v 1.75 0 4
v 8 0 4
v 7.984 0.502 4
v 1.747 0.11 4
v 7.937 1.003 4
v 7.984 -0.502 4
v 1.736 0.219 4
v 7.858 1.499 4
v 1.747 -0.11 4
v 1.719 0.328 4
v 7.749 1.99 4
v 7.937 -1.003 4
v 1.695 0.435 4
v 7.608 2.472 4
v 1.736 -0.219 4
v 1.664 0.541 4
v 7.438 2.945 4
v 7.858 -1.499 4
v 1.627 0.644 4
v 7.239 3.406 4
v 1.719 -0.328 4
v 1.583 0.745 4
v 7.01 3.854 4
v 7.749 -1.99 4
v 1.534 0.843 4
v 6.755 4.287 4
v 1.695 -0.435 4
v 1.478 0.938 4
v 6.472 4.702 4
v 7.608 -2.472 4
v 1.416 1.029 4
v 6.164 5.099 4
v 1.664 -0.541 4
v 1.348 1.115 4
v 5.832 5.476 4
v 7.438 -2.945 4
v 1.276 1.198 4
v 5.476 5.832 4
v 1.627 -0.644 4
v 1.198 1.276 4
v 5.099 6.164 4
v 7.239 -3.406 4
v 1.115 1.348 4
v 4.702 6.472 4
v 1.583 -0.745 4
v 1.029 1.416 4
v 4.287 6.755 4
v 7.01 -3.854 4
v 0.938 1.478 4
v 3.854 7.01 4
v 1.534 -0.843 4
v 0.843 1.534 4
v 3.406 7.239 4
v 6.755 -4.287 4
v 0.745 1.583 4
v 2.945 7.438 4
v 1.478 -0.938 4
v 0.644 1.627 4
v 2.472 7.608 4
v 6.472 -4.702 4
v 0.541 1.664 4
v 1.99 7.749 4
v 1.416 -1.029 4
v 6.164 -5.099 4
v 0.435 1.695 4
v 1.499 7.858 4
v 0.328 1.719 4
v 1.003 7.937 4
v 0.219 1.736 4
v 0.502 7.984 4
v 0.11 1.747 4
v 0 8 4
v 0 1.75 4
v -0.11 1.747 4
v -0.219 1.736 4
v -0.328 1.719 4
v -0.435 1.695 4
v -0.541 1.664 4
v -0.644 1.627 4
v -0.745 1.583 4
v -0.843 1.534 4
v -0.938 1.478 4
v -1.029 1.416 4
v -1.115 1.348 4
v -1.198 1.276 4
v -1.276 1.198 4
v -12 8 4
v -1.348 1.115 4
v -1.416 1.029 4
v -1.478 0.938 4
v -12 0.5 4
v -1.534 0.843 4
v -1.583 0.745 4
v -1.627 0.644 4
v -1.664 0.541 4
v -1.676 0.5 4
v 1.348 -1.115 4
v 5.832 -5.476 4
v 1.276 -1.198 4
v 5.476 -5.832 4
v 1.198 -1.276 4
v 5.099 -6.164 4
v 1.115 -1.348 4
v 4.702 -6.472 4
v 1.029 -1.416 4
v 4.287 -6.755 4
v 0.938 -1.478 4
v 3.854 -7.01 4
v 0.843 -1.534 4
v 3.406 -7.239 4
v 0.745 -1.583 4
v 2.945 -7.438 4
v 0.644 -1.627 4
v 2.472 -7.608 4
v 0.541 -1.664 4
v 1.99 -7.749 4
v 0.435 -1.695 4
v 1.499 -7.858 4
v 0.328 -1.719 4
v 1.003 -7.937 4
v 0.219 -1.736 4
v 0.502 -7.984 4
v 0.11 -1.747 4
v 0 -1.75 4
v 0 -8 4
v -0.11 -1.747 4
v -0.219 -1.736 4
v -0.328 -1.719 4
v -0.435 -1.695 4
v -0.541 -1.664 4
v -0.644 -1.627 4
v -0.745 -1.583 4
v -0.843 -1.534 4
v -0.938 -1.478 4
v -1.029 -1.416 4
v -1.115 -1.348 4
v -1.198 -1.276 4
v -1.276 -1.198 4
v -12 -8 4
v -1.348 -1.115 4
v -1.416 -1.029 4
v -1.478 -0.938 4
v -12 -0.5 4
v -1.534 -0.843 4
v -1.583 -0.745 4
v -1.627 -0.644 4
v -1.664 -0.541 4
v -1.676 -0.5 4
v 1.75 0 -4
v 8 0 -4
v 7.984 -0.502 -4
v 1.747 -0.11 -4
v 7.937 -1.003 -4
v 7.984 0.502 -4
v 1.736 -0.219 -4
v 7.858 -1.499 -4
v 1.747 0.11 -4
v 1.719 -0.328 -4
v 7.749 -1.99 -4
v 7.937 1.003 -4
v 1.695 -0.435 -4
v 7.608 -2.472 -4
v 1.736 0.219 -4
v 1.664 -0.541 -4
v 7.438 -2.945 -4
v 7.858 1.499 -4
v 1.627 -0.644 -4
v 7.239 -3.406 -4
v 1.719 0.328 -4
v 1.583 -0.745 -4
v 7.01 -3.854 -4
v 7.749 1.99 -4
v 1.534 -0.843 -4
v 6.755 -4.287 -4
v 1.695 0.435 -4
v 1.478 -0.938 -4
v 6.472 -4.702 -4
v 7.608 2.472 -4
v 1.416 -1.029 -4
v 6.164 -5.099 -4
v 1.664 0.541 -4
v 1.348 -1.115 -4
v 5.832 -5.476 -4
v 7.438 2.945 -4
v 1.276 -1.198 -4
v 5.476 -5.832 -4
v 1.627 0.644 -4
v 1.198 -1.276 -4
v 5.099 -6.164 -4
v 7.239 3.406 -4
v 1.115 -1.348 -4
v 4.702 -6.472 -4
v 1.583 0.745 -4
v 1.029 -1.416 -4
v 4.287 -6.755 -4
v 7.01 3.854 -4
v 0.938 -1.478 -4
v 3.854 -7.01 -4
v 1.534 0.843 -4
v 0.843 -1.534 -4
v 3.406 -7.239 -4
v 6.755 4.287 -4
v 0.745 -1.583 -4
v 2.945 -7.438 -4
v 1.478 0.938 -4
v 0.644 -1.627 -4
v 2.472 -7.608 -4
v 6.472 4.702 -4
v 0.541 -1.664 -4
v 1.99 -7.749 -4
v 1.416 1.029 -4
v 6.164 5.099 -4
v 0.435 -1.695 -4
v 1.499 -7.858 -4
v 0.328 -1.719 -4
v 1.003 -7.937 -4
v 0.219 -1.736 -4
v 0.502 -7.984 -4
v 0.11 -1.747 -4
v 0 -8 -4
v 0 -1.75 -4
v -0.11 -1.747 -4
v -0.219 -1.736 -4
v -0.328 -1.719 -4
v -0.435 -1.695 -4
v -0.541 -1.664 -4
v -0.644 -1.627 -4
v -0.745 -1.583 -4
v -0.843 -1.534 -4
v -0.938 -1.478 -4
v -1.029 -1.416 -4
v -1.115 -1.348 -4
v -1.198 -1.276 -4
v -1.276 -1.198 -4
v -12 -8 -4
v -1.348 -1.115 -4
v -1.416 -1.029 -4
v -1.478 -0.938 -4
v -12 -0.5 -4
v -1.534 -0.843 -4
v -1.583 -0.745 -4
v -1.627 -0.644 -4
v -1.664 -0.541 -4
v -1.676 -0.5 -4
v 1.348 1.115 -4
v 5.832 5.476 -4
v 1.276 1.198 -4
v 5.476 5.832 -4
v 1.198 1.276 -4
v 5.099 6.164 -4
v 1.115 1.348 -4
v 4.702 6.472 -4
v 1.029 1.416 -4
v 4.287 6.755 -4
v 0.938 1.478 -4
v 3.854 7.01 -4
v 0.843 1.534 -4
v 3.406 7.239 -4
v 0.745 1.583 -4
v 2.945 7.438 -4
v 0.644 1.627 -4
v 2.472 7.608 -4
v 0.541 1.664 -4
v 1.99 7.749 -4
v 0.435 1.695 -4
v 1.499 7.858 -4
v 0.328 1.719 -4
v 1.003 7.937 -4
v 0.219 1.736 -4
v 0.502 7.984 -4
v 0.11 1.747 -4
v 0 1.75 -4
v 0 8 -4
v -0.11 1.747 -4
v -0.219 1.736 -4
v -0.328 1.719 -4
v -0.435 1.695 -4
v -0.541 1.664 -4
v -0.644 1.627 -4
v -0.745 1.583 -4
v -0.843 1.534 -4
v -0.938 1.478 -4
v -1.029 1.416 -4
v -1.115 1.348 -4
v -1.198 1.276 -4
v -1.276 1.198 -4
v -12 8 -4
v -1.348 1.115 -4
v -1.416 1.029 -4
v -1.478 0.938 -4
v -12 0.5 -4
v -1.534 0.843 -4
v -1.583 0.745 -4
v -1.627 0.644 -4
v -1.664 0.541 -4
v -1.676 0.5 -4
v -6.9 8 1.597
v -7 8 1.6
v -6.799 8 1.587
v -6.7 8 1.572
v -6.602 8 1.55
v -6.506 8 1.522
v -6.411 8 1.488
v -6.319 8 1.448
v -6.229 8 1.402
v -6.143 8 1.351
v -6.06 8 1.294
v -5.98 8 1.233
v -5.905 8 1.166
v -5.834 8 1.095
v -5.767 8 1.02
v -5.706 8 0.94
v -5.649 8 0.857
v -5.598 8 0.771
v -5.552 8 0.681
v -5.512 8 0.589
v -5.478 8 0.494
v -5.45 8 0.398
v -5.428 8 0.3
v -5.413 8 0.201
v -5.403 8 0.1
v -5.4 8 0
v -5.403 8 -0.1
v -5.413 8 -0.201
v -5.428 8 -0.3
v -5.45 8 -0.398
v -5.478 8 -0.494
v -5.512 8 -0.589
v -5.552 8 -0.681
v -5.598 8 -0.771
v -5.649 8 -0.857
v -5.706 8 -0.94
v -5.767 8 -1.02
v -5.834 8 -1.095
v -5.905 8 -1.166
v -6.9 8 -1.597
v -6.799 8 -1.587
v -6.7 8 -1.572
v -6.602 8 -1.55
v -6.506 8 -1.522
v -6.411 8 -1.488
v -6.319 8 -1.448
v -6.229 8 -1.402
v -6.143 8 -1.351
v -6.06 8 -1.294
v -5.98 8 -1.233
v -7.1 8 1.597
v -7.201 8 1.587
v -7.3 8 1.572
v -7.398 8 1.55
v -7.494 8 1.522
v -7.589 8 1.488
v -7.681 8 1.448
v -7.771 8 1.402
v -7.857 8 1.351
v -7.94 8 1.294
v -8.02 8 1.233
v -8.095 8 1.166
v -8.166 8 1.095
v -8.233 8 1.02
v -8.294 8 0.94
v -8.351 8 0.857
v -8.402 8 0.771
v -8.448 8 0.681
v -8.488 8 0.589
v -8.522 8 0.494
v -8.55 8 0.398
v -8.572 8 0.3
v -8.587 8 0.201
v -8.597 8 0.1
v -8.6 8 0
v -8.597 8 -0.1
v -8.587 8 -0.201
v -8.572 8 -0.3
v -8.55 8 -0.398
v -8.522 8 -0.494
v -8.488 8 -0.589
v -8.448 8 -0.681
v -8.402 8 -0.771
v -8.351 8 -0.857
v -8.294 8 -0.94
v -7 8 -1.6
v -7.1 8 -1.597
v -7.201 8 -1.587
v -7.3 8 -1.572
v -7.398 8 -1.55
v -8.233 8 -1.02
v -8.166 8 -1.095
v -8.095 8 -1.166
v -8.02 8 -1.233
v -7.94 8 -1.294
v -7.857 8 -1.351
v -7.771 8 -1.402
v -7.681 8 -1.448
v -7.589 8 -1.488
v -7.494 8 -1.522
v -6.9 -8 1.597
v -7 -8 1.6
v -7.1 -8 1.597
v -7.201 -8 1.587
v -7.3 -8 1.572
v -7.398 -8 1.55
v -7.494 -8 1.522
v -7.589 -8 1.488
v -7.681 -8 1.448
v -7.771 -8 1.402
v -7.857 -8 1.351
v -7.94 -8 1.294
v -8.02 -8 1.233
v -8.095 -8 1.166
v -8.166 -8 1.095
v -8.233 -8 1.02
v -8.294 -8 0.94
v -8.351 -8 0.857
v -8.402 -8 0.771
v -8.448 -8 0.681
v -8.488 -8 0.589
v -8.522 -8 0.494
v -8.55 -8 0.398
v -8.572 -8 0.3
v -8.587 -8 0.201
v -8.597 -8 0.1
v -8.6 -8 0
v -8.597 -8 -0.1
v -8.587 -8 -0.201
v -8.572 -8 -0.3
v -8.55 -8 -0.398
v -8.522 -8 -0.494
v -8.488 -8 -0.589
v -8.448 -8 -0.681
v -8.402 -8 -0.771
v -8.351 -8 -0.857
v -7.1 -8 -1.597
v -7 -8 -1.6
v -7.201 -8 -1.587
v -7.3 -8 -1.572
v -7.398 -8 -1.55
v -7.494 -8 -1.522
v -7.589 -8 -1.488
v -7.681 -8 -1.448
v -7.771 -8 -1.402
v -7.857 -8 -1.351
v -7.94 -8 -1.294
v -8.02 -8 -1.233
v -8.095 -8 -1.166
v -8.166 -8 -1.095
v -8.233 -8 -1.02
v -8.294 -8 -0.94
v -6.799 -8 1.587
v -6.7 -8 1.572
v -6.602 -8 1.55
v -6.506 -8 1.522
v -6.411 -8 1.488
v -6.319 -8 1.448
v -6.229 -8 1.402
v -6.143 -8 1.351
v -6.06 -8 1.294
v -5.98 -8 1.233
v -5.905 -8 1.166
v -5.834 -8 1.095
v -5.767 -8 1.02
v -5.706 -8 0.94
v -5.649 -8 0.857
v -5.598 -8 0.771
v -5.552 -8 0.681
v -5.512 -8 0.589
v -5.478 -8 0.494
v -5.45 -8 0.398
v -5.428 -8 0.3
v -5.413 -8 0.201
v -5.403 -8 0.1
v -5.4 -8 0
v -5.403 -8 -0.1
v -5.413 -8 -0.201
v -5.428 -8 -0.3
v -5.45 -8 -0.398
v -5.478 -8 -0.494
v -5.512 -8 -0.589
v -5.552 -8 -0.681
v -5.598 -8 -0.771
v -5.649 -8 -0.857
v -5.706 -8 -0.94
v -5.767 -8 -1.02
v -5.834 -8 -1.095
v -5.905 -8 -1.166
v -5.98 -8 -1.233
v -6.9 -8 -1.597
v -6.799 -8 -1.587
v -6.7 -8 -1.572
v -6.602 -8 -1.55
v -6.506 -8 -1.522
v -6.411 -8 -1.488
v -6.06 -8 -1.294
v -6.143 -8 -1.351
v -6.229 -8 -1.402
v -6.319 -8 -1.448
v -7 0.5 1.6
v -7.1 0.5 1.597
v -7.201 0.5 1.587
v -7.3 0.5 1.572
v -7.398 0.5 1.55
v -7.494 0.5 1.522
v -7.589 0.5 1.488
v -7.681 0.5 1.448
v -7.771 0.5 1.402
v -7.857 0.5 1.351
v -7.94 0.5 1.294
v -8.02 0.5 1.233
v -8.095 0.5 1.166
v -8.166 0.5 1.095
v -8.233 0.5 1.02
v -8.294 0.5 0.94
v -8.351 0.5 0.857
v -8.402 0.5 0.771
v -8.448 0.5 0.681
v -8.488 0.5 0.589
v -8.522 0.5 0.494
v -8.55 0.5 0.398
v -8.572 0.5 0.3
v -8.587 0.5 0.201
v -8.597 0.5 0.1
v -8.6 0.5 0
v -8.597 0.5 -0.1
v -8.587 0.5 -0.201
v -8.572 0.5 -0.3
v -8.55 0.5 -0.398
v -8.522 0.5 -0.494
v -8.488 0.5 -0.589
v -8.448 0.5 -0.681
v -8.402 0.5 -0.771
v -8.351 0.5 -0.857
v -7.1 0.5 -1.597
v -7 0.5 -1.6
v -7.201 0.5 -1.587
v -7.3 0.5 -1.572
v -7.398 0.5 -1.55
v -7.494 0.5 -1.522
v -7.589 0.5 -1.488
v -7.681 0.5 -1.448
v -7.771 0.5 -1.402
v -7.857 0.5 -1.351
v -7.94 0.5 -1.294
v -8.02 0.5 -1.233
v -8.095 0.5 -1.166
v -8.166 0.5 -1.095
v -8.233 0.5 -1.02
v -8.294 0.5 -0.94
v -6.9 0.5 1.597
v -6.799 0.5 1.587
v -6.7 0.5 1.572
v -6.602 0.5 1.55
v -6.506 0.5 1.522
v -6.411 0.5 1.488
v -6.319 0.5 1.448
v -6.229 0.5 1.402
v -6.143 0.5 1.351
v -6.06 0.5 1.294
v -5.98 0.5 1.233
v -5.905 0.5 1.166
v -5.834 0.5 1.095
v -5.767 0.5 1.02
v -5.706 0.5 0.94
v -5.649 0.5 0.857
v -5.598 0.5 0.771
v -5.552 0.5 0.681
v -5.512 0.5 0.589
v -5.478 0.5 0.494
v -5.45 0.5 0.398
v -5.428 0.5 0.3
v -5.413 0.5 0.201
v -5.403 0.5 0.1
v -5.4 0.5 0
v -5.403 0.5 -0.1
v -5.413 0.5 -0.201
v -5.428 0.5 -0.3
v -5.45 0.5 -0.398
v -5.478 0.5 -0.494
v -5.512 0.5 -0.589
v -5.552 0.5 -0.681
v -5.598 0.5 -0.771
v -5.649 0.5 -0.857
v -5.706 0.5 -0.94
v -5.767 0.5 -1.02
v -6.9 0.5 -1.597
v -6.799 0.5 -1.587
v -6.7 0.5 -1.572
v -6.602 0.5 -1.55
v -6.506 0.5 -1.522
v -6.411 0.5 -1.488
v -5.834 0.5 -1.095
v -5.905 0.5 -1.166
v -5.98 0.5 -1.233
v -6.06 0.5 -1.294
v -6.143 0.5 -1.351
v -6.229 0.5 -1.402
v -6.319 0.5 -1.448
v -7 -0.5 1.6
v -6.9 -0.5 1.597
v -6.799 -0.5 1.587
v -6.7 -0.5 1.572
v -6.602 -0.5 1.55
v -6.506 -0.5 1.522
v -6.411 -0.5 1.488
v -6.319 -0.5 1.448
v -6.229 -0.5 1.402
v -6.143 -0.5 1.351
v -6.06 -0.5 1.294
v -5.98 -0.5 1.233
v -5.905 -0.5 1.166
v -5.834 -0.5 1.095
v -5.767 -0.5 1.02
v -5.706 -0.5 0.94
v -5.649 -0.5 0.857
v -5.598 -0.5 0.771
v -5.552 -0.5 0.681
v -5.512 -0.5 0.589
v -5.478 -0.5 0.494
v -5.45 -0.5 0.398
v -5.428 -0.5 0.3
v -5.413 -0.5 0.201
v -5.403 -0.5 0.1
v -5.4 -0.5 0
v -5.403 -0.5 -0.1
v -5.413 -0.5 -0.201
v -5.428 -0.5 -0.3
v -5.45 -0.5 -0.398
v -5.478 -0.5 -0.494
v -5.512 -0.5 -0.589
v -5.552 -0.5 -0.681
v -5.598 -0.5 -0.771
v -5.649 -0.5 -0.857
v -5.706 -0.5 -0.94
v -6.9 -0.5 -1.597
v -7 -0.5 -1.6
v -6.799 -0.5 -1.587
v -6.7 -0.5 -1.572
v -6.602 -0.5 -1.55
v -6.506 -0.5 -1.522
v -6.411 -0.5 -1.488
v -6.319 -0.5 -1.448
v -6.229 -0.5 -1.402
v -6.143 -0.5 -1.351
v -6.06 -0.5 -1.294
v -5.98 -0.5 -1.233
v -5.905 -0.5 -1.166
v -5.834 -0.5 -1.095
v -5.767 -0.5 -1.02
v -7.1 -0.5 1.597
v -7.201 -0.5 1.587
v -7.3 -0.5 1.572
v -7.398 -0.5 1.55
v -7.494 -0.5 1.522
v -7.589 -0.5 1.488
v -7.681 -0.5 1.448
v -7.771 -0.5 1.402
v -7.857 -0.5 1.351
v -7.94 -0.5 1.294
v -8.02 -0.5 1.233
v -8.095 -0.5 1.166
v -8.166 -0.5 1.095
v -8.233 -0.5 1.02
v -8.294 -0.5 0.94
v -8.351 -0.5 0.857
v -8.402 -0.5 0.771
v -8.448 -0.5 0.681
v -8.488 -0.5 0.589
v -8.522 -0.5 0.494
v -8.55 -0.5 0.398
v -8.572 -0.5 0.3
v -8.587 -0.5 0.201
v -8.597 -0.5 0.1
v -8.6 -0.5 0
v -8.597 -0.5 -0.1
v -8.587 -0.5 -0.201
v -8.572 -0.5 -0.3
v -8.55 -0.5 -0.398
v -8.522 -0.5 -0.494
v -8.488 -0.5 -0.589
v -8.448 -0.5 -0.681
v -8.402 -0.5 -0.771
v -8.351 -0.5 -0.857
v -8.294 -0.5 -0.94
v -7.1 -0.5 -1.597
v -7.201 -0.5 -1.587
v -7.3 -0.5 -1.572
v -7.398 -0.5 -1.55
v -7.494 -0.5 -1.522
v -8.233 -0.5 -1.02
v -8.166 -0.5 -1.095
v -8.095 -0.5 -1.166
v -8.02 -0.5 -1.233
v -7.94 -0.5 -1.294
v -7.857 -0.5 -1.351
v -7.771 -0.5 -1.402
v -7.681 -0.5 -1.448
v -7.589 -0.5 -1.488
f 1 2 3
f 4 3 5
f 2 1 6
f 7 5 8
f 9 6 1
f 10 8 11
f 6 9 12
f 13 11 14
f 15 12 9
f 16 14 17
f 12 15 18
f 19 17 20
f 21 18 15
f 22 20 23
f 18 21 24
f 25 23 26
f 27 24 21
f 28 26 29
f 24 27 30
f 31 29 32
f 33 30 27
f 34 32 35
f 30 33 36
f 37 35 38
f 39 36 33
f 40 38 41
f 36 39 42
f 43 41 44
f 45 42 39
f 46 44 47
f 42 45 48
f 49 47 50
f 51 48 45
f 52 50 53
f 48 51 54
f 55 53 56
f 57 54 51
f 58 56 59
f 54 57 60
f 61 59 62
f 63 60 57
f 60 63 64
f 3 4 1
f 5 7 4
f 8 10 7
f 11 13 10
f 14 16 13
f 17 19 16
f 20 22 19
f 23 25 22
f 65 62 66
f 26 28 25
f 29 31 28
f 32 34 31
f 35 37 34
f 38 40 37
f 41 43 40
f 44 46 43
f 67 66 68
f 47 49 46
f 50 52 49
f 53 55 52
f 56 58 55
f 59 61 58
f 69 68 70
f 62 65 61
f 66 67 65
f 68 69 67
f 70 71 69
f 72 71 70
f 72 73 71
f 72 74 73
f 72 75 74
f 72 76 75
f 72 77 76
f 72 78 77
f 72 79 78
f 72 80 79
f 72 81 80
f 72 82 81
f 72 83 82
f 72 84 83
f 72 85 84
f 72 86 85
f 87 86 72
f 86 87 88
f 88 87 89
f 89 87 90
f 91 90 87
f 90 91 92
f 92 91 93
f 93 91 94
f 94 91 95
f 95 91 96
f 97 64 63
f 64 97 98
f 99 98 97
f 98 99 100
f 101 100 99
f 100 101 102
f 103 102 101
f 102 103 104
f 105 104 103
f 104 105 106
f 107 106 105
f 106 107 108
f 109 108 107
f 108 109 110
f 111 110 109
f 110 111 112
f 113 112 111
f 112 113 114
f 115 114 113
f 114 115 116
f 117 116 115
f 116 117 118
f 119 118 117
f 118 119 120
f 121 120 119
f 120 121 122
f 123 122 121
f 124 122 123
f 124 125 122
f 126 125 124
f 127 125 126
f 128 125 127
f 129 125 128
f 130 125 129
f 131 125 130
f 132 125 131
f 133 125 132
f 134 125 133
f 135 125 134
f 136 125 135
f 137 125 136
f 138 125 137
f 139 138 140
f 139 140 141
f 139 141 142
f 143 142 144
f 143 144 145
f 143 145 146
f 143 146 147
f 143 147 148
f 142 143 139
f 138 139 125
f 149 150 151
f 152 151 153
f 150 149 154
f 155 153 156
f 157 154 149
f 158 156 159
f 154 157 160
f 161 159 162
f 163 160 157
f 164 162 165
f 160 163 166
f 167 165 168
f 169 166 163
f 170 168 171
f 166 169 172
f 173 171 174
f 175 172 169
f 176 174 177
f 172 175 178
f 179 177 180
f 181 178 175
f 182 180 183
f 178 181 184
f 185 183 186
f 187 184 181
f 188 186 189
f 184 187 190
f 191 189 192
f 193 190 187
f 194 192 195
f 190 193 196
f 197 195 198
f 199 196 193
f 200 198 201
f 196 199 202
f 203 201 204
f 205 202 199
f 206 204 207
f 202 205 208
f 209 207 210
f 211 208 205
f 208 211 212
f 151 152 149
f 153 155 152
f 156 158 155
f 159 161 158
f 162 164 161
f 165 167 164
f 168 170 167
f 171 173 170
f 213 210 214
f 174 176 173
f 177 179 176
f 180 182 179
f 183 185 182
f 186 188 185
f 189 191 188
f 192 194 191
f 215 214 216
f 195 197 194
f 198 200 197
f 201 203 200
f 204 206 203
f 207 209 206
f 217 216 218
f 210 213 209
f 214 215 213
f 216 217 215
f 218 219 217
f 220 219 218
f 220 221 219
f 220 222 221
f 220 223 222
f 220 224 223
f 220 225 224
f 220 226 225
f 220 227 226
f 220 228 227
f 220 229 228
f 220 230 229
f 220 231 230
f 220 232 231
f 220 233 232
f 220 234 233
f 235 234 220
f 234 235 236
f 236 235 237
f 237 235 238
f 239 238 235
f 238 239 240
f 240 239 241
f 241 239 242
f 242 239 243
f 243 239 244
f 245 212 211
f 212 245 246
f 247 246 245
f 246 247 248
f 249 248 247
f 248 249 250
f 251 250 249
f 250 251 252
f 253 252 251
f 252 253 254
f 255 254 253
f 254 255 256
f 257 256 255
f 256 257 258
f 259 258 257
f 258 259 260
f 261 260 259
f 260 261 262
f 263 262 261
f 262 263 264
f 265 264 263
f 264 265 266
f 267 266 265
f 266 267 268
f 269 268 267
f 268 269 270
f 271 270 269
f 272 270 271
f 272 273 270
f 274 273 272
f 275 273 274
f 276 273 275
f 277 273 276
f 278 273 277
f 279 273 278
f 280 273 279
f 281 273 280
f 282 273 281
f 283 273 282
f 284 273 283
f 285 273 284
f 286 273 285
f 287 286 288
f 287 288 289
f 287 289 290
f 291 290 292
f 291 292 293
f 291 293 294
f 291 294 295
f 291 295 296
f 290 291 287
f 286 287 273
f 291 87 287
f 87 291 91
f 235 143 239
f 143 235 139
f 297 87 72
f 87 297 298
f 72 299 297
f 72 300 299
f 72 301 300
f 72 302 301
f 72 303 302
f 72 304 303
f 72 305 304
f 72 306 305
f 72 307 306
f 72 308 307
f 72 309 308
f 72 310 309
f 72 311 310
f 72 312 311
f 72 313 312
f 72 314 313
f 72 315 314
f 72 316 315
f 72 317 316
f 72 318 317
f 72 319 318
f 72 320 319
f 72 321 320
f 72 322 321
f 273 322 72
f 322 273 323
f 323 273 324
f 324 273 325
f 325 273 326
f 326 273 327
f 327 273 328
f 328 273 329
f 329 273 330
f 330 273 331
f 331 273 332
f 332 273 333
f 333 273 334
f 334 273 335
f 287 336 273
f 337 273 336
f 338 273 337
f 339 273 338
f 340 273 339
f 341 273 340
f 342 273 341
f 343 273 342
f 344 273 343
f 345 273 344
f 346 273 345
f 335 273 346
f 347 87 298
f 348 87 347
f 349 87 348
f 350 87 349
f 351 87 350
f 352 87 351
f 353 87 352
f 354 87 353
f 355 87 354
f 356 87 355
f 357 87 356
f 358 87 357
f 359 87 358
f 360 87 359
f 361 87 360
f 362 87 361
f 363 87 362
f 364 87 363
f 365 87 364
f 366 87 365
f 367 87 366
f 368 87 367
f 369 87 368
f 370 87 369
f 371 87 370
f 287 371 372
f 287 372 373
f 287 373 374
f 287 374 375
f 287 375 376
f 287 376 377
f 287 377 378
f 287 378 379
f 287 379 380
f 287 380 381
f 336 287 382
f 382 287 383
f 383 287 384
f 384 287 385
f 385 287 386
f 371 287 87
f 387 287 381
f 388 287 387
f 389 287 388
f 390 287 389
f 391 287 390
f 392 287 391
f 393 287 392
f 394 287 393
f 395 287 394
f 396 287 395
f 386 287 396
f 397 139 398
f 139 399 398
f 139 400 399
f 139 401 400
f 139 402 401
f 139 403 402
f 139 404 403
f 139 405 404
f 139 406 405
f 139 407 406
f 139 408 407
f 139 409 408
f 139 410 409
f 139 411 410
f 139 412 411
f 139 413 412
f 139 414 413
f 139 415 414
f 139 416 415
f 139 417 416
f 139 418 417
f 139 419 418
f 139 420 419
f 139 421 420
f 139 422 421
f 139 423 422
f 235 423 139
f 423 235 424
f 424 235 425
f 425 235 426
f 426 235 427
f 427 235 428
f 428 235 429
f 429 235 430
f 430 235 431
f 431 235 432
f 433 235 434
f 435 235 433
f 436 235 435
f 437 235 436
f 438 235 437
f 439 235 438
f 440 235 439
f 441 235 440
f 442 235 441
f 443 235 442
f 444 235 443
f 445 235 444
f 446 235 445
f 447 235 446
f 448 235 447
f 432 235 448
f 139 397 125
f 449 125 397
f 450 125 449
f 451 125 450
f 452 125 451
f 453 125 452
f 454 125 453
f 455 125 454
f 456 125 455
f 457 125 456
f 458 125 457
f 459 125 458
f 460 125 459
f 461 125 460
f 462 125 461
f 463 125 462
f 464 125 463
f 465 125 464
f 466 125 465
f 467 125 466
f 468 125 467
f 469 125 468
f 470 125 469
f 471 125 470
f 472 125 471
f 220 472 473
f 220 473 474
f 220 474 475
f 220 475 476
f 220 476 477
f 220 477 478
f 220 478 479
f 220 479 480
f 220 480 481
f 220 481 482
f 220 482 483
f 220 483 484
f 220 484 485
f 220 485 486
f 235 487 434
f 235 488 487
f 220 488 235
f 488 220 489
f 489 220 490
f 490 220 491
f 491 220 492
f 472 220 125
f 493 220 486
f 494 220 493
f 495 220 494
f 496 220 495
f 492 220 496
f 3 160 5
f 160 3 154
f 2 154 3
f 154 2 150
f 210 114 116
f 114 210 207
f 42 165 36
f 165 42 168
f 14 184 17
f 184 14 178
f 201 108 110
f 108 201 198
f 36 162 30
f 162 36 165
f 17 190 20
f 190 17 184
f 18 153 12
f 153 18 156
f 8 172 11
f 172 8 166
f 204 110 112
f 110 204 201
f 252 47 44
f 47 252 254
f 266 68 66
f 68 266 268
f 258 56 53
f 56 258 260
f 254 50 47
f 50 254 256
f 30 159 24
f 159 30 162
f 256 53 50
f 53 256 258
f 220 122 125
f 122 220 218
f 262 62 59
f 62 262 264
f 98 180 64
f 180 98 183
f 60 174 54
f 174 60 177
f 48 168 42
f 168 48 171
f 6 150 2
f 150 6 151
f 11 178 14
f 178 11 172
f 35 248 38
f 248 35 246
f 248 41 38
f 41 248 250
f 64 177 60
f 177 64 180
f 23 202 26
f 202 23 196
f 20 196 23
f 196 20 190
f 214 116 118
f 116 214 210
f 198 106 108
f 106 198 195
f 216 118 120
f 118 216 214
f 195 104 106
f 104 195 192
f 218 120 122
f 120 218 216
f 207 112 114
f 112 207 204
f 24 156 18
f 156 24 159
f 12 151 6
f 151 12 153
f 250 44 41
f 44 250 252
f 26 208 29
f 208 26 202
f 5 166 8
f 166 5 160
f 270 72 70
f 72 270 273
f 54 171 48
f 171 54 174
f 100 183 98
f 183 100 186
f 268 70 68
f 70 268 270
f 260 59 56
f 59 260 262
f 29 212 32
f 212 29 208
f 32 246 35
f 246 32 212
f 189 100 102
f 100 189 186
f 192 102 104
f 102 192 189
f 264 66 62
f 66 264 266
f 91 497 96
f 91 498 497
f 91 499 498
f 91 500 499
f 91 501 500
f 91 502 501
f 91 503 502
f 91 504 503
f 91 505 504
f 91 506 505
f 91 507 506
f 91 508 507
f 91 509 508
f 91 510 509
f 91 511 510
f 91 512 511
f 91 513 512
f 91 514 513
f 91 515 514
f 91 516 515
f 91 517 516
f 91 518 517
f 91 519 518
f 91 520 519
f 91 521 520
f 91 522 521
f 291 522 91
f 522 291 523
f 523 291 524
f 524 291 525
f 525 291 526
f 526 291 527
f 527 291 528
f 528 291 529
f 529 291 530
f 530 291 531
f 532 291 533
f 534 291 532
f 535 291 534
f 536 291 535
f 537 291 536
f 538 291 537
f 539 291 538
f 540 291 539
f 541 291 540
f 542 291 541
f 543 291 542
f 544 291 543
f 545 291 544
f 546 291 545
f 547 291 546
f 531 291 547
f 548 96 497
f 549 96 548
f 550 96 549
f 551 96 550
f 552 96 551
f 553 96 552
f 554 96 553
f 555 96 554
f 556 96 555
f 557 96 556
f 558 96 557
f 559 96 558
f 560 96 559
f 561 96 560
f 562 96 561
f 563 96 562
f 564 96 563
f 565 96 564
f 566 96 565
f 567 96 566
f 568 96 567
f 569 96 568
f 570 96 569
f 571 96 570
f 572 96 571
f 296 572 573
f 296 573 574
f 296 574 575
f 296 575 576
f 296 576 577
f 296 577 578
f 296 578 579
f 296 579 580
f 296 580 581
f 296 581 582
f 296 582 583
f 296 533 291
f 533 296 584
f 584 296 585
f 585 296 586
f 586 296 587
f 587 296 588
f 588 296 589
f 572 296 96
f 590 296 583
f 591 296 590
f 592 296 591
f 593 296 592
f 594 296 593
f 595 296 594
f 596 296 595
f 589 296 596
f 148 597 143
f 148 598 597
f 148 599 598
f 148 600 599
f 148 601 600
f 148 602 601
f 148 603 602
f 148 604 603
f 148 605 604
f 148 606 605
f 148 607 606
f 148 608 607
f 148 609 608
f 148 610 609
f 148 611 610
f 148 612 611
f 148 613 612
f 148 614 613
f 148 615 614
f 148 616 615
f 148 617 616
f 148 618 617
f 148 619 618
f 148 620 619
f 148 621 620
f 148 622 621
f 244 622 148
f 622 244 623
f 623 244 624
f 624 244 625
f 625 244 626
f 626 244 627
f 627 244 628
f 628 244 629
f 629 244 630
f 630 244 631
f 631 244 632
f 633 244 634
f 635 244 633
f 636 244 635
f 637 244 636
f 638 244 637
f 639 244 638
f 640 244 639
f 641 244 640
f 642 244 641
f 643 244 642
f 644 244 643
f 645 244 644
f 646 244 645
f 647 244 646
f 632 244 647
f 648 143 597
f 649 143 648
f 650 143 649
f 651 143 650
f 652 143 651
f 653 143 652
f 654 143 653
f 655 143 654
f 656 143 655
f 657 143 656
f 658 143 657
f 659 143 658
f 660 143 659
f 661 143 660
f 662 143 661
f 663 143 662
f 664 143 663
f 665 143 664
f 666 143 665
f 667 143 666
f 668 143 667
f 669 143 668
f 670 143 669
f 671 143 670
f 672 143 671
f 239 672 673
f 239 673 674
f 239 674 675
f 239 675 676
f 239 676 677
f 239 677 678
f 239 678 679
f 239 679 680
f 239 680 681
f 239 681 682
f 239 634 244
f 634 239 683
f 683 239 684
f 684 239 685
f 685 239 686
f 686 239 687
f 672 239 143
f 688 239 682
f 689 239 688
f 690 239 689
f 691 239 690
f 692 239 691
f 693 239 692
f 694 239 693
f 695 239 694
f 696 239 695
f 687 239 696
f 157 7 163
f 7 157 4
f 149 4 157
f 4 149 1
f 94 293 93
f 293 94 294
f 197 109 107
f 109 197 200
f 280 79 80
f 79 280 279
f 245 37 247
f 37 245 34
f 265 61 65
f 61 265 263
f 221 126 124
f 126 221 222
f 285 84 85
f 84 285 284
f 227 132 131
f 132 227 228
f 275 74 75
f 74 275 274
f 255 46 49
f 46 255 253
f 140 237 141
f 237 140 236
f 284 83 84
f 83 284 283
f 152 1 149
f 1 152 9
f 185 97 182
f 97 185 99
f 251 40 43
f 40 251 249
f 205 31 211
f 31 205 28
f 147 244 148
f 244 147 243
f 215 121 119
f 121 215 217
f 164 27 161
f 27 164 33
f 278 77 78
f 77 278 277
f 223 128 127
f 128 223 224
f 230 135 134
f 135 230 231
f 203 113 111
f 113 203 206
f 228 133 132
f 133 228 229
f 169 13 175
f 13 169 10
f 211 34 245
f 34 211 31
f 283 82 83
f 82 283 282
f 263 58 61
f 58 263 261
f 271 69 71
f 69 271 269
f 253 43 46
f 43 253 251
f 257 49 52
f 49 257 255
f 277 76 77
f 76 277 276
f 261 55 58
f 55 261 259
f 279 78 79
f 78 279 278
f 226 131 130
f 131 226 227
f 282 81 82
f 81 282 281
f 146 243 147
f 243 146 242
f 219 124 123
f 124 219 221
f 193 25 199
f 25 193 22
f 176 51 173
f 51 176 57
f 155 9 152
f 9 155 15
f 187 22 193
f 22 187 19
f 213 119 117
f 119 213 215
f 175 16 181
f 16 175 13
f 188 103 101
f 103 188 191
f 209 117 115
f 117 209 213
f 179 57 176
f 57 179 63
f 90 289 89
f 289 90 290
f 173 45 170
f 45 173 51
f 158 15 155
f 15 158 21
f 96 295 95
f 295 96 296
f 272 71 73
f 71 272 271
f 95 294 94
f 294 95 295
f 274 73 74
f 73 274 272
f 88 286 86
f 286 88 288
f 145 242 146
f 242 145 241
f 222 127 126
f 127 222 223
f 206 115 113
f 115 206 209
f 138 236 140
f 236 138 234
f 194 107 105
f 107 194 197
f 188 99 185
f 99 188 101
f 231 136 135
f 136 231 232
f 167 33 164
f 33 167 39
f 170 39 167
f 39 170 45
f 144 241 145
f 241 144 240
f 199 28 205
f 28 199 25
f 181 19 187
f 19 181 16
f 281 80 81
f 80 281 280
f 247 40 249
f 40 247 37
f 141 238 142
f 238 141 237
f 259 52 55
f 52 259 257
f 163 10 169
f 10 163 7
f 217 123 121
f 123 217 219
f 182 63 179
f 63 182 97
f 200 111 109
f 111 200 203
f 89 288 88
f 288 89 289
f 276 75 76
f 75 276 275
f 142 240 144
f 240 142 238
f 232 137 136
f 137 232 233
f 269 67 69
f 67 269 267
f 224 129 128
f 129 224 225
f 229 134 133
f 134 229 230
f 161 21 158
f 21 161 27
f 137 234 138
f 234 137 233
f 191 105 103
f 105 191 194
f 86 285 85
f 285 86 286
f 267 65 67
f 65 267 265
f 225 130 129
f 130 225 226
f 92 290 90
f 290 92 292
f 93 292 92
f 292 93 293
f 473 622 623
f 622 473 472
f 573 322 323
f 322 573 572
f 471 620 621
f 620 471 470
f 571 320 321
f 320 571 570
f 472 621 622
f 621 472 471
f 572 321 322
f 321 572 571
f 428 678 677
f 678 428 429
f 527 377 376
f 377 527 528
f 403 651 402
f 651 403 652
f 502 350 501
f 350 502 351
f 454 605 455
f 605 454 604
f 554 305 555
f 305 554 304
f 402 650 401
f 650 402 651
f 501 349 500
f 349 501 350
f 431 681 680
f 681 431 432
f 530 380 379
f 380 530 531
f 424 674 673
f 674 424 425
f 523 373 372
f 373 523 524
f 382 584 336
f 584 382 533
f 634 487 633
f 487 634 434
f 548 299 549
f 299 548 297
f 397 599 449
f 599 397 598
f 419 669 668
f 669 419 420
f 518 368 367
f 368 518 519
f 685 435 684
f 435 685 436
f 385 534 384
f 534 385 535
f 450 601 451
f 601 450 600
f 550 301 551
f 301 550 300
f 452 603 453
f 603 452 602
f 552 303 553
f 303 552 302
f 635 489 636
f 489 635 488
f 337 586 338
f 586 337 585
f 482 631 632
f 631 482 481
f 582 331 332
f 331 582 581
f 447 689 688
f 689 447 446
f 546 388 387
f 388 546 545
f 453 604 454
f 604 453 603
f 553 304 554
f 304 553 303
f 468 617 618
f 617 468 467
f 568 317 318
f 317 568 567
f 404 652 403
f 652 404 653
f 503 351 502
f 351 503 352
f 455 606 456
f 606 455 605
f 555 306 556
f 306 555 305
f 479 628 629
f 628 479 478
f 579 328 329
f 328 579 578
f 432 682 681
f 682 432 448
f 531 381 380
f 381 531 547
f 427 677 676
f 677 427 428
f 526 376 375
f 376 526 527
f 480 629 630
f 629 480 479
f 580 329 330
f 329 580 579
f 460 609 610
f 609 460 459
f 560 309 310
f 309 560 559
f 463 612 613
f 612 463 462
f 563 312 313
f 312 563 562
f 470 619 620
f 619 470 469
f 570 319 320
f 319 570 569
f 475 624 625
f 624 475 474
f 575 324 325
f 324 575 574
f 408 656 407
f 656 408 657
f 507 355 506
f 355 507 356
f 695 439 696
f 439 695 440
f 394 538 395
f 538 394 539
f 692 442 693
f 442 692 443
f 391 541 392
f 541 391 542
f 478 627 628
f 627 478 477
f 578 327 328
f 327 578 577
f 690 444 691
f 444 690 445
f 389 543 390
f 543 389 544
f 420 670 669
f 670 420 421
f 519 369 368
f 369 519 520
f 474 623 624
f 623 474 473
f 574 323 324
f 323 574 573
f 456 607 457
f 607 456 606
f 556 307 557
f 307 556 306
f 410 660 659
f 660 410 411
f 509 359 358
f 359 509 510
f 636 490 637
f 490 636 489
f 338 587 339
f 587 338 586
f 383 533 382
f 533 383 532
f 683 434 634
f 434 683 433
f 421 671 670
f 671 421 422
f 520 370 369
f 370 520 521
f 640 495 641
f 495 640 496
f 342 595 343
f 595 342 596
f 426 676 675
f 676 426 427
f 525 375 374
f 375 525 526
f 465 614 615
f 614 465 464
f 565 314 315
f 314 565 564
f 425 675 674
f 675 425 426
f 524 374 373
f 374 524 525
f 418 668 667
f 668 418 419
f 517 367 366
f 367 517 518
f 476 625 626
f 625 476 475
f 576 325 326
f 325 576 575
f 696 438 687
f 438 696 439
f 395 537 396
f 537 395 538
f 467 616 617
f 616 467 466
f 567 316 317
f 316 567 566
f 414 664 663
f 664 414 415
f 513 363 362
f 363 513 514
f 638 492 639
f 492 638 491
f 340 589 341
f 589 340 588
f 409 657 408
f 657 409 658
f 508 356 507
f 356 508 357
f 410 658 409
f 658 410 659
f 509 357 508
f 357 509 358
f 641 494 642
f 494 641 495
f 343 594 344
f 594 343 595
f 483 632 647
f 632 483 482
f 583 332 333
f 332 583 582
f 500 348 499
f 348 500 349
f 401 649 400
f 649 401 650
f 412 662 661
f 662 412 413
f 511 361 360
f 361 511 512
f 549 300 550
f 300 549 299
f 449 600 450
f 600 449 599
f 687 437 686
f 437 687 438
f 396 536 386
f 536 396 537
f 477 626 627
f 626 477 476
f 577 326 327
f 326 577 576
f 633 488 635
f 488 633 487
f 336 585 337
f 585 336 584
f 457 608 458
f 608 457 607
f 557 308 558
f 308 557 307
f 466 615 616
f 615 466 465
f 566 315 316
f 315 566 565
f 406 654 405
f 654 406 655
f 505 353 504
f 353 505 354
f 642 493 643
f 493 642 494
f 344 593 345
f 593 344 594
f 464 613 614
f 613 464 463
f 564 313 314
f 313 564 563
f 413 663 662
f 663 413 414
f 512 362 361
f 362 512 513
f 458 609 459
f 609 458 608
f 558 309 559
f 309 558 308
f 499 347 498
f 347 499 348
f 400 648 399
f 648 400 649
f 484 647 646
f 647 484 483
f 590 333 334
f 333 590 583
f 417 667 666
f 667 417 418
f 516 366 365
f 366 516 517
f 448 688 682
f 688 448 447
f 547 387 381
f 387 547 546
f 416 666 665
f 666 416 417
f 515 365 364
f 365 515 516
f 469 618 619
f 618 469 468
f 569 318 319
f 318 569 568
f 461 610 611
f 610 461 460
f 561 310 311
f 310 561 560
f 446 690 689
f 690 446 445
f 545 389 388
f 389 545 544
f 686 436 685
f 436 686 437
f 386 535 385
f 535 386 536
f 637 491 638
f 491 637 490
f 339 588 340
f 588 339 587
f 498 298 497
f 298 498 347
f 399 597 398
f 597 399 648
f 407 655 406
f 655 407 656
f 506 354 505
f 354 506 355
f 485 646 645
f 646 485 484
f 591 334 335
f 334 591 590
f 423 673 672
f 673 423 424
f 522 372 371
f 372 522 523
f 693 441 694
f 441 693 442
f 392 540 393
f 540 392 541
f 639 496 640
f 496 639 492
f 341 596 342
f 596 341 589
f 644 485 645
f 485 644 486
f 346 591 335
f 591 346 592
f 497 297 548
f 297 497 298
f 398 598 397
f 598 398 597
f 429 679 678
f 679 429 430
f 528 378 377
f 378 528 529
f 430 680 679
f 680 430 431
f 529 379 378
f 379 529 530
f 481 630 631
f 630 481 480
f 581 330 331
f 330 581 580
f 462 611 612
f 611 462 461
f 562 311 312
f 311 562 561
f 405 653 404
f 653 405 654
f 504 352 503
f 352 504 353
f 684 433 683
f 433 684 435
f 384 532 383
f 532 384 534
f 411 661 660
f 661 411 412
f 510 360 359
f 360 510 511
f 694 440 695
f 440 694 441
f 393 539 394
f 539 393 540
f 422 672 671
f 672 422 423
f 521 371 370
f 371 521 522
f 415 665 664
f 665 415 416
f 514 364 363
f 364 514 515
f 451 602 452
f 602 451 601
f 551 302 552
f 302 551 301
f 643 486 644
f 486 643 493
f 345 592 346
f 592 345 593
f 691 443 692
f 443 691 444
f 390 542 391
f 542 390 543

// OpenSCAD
height=8;
radius=1.75;
difference(){
union(){
translate([-6,0,0]) cube([12,16,height],center=true);
cylinder(h=height,r=8, center=true, $fn=100);
}
translate([-10,0,0]) cube([20,1,height+4],center=true);
cylinder(h=30,r=radius, center=true, $fn=100);
translate([-7,0,0]) rotate([90,0,0]) cylinder(h=30,r=1.6, center=true, $fn=100);
}
